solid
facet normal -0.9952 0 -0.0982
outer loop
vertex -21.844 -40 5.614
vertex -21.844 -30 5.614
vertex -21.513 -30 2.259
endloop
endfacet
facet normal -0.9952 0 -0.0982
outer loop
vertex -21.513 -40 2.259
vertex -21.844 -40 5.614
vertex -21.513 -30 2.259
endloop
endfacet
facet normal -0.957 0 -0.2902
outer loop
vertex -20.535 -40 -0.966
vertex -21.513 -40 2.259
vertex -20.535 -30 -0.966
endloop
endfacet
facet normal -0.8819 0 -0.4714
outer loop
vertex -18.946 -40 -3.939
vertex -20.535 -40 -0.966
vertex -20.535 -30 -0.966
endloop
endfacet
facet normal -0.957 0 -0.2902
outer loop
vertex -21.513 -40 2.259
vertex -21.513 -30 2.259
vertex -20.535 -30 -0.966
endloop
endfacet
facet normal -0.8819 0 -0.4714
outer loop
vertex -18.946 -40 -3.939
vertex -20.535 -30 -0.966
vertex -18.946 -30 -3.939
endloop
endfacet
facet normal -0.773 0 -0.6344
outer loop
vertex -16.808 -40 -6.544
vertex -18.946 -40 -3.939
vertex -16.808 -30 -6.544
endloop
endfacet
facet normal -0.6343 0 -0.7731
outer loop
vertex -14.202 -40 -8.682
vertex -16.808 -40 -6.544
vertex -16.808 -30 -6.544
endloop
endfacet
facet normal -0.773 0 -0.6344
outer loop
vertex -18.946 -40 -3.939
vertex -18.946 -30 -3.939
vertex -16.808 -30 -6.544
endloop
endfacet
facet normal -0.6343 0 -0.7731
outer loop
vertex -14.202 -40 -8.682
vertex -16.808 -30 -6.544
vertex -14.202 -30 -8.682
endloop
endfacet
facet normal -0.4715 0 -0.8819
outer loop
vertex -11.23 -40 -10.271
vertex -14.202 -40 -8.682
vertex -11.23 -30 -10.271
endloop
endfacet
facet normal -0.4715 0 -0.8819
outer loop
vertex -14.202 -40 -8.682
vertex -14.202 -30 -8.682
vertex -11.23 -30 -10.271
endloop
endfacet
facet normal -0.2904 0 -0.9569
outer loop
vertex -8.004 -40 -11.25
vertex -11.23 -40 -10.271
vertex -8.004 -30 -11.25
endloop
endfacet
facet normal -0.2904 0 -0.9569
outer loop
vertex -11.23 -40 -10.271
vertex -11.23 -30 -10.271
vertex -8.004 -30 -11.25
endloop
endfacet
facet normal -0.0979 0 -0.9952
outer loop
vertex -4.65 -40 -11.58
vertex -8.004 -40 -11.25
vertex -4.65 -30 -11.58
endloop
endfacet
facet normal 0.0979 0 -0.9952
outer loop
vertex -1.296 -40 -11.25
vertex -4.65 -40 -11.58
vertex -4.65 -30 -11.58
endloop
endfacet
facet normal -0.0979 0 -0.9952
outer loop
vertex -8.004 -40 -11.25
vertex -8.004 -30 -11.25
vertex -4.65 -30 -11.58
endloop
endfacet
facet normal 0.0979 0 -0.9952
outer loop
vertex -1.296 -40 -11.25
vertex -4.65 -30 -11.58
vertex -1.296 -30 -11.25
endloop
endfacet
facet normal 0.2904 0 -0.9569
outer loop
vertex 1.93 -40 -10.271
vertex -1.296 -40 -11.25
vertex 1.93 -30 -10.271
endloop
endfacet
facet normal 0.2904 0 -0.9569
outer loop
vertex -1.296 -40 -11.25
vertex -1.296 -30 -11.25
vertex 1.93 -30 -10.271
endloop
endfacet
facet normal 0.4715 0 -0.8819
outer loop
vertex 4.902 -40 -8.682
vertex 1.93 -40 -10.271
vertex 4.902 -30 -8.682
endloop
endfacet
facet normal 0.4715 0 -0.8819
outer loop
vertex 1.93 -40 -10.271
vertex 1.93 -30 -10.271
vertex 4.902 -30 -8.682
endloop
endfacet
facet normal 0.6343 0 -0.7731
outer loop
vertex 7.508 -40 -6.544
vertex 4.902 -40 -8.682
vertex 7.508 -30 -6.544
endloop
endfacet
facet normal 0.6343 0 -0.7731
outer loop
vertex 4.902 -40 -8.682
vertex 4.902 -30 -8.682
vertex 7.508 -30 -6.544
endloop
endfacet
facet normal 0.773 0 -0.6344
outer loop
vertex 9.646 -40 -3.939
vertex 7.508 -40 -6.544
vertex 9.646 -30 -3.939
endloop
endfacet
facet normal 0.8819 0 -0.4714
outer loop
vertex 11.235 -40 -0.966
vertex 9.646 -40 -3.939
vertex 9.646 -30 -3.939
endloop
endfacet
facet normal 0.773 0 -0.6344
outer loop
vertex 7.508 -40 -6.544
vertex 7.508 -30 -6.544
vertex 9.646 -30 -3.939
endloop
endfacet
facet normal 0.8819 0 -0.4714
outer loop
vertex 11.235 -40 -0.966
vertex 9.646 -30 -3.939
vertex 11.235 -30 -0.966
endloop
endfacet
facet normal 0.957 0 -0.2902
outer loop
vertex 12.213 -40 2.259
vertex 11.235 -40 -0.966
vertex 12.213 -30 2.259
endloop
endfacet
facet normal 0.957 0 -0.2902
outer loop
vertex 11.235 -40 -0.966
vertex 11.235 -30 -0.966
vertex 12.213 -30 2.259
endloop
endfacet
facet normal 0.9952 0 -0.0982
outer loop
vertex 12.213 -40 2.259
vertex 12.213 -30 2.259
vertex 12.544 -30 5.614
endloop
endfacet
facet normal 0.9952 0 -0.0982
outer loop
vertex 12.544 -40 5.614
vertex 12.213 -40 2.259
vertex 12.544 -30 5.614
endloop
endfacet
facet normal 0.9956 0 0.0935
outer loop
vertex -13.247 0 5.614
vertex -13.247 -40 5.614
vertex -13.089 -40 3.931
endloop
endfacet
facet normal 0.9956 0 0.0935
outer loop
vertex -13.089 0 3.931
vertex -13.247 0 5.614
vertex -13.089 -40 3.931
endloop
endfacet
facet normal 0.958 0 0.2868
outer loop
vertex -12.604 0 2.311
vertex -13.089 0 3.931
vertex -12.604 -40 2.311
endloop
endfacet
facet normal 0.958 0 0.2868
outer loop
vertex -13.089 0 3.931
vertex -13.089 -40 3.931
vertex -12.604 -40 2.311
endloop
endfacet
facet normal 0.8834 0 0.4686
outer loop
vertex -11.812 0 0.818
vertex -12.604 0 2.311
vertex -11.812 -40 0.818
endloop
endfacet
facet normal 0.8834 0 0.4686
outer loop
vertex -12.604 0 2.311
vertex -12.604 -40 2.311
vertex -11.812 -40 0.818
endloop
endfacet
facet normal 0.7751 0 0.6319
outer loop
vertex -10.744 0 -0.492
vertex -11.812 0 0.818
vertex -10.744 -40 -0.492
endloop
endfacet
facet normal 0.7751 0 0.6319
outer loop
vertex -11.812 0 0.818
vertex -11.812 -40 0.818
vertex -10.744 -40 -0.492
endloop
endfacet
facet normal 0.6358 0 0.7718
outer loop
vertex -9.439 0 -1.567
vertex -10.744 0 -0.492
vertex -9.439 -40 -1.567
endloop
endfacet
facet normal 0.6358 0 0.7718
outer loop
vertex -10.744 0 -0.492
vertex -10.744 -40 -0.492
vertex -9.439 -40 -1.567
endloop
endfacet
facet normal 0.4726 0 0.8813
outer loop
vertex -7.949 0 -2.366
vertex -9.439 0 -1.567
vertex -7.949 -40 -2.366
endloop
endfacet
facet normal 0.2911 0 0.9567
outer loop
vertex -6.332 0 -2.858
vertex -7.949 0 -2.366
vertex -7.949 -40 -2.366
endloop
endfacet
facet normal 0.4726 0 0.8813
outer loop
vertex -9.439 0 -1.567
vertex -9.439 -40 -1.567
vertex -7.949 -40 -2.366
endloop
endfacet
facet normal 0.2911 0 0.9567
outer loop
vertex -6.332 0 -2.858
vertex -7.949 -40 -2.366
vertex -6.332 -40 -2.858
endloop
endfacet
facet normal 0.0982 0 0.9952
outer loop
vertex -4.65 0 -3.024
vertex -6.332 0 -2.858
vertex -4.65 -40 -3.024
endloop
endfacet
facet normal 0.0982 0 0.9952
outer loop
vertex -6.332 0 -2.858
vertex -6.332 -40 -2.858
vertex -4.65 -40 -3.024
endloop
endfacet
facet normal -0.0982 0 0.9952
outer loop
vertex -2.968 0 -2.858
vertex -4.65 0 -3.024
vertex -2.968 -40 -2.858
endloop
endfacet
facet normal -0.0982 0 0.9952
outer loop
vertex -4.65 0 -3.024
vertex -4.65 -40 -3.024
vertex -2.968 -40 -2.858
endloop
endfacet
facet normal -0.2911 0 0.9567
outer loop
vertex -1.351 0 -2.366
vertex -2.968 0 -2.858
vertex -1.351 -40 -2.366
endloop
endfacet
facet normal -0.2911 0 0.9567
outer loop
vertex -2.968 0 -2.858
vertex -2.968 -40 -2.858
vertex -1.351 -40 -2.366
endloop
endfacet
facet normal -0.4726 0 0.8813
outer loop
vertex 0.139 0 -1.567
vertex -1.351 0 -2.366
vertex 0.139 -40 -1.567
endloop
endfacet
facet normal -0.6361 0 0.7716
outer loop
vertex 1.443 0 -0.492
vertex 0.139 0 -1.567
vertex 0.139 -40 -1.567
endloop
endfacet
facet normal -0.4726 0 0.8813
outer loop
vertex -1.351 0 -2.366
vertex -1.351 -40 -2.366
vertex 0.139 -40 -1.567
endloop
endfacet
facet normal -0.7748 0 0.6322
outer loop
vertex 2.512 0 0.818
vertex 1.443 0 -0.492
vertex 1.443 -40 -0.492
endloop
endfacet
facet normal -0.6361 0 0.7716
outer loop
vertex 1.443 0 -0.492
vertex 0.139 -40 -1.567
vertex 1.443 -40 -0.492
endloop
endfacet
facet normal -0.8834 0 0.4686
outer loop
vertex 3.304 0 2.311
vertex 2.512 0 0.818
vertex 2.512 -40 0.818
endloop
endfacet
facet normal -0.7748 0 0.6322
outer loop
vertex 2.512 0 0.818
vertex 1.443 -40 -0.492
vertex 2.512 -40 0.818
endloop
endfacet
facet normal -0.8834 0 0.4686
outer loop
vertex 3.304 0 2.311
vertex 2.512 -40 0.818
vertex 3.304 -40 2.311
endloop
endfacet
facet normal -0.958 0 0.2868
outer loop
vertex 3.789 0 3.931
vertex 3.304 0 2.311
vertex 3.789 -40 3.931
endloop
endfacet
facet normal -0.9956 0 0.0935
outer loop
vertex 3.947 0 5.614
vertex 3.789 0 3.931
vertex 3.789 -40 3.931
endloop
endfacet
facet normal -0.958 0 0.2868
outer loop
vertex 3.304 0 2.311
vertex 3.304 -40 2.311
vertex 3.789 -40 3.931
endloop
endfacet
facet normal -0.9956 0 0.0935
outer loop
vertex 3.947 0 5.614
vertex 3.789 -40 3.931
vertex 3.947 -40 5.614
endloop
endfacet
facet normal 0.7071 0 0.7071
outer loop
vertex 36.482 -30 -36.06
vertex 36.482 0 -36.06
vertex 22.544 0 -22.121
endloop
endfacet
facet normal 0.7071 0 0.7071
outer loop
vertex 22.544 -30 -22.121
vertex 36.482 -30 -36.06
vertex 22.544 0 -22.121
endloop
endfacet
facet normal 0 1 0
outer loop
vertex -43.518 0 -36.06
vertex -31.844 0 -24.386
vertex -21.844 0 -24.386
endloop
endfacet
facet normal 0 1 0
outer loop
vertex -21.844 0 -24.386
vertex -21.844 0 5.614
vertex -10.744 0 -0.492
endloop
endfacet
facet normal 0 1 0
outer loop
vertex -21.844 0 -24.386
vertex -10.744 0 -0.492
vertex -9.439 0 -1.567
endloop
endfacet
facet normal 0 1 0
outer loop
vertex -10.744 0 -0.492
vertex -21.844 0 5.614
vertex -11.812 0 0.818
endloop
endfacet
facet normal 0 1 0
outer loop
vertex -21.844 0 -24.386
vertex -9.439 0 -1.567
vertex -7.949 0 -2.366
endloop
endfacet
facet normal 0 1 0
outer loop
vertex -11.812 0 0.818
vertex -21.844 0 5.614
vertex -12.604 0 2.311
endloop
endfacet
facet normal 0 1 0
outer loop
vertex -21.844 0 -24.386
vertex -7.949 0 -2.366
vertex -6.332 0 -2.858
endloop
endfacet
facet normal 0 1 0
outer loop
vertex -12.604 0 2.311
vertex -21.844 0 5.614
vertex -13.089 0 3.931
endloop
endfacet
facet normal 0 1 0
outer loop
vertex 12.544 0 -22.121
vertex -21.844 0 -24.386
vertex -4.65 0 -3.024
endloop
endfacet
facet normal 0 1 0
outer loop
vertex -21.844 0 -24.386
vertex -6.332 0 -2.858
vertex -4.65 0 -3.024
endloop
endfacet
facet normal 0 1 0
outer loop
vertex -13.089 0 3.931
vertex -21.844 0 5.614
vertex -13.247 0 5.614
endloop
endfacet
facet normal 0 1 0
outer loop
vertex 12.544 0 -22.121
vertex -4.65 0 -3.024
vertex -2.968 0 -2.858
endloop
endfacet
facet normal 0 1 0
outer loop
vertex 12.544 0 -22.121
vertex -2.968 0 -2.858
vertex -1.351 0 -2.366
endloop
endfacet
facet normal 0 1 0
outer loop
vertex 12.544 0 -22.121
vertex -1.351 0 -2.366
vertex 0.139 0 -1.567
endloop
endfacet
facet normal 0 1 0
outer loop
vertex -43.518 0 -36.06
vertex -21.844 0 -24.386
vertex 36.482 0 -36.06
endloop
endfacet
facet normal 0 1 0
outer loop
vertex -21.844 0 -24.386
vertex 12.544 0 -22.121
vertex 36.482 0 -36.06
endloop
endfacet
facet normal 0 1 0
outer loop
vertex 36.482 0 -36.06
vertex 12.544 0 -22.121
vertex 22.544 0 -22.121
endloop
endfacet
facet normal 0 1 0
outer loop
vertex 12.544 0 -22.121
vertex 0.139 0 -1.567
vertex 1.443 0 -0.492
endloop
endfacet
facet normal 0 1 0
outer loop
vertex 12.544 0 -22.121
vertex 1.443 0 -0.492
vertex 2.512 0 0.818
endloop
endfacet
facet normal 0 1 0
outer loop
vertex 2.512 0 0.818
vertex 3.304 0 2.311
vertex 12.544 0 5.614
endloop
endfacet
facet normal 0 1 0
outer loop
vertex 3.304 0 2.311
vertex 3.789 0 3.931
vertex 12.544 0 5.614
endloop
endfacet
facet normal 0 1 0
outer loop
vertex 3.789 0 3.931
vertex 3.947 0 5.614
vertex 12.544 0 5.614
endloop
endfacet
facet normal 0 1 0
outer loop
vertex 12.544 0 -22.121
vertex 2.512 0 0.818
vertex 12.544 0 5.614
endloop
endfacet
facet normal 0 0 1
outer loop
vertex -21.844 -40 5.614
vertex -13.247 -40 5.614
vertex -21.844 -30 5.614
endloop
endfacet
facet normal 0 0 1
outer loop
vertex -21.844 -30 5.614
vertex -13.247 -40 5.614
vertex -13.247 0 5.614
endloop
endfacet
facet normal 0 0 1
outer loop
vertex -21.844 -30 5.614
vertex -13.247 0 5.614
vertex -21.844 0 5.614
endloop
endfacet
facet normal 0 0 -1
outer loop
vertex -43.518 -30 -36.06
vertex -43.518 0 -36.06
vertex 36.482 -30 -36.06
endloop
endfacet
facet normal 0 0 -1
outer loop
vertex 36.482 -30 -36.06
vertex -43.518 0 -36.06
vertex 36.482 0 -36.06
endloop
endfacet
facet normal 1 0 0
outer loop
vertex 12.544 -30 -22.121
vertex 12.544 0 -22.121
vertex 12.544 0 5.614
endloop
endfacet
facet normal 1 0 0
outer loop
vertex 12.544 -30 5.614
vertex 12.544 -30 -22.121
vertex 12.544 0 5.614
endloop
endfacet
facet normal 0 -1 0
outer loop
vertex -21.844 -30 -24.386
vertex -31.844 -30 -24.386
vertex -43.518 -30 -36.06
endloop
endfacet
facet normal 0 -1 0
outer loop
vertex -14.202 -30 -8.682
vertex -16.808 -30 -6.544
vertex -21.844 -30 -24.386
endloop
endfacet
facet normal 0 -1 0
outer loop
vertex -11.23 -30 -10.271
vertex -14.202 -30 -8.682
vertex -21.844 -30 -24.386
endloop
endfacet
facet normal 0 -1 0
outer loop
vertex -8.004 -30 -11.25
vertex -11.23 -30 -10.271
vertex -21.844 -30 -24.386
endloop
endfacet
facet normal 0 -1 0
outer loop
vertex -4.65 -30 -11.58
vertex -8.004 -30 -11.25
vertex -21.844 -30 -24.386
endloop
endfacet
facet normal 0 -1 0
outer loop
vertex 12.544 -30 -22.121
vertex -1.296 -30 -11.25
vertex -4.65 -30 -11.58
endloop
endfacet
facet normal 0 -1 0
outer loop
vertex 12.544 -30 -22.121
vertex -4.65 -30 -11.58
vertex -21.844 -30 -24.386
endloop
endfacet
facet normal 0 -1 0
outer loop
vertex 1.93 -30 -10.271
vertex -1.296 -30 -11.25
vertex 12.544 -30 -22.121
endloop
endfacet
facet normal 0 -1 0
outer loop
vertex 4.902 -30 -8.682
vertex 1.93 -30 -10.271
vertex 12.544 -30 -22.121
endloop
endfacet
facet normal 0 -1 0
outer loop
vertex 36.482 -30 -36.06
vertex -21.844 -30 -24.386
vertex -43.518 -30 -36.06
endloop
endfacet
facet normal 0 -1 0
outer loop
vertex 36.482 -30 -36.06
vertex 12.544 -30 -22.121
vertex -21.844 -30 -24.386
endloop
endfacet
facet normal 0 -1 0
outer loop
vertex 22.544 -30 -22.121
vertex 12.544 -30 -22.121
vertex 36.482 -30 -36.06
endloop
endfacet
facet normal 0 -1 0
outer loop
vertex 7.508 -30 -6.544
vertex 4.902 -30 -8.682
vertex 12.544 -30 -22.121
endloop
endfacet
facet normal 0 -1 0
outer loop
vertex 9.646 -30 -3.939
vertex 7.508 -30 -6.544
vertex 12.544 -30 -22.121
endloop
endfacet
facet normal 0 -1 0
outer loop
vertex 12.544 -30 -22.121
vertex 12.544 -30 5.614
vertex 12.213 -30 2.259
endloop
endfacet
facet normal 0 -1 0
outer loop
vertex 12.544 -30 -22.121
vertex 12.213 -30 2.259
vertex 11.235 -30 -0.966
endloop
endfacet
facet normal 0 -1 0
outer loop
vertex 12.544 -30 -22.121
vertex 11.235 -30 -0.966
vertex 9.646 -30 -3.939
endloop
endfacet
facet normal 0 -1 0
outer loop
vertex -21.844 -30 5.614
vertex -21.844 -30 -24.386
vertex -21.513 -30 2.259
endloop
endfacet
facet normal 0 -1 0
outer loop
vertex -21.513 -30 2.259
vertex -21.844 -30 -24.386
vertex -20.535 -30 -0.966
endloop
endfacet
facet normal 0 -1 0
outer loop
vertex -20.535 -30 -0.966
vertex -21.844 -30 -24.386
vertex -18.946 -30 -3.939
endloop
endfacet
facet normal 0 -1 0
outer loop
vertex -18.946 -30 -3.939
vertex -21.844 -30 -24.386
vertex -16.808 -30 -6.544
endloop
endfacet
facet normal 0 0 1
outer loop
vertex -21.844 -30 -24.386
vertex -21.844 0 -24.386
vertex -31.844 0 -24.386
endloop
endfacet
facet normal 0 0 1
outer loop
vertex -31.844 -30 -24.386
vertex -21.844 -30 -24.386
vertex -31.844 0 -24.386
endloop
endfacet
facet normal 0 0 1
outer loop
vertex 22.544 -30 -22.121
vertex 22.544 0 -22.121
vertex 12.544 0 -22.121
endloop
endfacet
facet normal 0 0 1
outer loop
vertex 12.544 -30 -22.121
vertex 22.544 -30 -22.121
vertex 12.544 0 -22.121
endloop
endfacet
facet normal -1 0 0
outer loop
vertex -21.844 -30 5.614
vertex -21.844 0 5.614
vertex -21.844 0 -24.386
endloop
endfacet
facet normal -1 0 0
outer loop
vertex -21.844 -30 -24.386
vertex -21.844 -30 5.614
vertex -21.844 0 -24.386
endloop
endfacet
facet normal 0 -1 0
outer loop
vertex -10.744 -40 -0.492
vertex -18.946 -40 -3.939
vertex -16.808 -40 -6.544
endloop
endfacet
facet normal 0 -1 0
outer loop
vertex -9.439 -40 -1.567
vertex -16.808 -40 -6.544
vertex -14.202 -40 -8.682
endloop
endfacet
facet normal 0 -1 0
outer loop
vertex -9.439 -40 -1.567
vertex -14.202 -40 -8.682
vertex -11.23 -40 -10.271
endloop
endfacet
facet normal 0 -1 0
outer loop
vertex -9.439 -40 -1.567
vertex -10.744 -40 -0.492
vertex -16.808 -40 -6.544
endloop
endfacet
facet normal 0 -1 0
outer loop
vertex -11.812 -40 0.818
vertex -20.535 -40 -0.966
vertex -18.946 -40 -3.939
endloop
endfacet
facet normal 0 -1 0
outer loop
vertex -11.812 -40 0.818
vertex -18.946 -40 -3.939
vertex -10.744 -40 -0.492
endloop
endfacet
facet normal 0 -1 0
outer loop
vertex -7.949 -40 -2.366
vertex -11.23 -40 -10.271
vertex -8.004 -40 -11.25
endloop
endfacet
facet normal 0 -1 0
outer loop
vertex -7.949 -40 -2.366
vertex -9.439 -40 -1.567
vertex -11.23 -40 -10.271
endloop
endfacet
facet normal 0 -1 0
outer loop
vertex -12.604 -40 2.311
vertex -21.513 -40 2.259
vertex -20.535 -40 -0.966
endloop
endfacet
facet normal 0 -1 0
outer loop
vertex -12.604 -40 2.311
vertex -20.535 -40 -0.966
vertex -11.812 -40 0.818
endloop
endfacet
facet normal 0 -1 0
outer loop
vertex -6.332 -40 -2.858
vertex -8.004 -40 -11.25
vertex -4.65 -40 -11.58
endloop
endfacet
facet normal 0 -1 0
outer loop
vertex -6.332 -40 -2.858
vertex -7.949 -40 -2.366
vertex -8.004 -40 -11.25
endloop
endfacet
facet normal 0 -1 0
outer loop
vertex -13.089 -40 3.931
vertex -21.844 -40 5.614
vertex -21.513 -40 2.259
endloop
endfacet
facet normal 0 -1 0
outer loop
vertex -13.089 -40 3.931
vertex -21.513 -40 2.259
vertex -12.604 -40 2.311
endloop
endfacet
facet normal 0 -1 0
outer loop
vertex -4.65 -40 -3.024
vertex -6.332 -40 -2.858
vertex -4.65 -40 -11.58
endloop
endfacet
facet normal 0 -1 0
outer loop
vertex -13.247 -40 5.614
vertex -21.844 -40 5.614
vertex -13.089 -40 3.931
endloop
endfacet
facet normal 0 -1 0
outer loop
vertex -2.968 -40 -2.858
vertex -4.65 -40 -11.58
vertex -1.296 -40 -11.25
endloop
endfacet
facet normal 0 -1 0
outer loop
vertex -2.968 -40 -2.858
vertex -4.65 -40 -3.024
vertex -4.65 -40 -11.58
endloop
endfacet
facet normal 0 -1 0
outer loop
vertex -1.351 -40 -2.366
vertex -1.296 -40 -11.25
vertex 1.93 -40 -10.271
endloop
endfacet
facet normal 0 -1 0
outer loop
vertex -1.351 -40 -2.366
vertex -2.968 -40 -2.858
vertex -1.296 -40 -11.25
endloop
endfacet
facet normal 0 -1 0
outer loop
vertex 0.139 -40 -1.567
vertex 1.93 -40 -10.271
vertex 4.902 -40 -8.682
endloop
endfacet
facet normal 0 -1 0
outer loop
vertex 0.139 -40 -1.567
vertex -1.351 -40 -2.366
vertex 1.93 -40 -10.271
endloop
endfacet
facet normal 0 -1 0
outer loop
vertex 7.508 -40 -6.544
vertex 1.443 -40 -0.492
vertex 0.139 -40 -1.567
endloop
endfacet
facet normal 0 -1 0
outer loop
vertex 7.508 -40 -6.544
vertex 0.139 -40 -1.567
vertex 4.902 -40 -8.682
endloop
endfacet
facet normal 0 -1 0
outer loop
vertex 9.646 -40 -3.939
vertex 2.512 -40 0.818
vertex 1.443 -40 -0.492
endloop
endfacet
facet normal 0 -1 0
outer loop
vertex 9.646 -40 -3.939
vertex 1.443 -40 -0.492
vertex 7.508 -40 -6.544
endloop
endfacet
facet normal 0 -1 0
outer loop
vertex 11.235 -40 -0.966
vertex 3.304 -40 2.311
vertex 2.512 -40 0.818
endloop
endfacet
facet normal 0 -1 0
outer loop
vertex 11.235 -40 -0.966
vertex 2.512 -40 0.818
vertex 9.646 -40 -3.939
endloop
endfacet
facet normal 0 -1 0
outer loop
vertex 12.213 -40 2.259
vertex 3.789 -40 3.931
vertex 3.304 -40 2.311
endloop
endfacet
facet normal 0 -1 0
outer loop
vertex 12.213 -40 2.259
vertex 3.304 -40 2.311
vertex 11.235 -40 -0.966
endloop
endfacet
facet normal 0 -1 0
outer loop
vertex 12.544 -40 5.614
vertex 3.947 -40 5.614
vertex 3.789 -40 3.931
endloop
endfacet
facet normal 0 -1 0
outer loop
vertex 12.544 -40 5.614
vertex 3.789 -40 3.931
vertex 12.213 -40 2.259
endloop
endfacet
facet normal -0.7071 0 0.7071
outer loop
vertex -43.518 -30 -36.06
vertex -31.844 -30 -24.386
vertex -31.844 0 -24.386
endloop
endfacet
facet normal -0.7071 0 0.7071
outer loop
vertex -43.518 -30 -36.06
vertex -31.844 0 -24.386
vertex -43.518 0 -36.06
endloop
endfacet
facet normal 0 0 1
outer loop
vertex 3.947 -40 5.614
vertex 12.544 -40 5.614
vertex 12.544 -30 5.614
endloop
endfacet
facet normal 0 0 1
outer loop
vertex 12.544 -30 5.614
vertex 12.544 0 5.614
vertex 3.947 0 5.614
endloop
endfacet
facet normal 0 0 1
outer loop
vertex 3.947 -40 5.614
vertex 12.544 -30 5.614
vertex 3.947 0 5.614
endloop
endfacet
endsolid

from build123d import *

# Parameters (mm, degrees)
F1_DEPTH = 30
F3_DEPTH = 10
F5_DEPTH = 40


with BuildPart() as f1:
    # F0 (on Front) → F1 (new body)
    with BuildSketch(Plane.XZ):
        Polygon((-31.843803, -24.386245), (-43.517503, -36.059944), (36.482497, -36.059944), (22.543686, -22.121133), (12.543686, -22.121133), (12.543686, 5.613755), (-21.843803, 5.613755), (-21.843803, -24.386245), align=None)
    extrude(amount=F1_DEPTH)

    # F2 (on face) → F3 (join)
    with BuildSketch(Plane.XZ.offset(30)):
        with BuildLine():
            Line((12.543686, 5.613755), (-21.843803, 5.613755))
            ThreePointArc((-21.843803, 5.613755), (-4.650059, -11.579989), (12.543686, 5.613755))
        make_face()
    extrude(amount=F3_DEPTH)

    # F4 (on face) → F5 (cut)
    with BuildSketch(Plane.XZ.offset(40)):
        with BuildLine():
            Line((-4.650059, 5.613755), (-13.246931, 5.613755))
            ThreePointArc((-13.246931, 5.613755), (-4.650059, -3.024393), (3.946813, 5.613755))
            Line((3.946813, 5.613755), (-4.650059, 5.613755))
        make_face()
    extrude(amount=-F5_DEPTH, mode=Mode.SUBTRACT)


solid = f1.part
